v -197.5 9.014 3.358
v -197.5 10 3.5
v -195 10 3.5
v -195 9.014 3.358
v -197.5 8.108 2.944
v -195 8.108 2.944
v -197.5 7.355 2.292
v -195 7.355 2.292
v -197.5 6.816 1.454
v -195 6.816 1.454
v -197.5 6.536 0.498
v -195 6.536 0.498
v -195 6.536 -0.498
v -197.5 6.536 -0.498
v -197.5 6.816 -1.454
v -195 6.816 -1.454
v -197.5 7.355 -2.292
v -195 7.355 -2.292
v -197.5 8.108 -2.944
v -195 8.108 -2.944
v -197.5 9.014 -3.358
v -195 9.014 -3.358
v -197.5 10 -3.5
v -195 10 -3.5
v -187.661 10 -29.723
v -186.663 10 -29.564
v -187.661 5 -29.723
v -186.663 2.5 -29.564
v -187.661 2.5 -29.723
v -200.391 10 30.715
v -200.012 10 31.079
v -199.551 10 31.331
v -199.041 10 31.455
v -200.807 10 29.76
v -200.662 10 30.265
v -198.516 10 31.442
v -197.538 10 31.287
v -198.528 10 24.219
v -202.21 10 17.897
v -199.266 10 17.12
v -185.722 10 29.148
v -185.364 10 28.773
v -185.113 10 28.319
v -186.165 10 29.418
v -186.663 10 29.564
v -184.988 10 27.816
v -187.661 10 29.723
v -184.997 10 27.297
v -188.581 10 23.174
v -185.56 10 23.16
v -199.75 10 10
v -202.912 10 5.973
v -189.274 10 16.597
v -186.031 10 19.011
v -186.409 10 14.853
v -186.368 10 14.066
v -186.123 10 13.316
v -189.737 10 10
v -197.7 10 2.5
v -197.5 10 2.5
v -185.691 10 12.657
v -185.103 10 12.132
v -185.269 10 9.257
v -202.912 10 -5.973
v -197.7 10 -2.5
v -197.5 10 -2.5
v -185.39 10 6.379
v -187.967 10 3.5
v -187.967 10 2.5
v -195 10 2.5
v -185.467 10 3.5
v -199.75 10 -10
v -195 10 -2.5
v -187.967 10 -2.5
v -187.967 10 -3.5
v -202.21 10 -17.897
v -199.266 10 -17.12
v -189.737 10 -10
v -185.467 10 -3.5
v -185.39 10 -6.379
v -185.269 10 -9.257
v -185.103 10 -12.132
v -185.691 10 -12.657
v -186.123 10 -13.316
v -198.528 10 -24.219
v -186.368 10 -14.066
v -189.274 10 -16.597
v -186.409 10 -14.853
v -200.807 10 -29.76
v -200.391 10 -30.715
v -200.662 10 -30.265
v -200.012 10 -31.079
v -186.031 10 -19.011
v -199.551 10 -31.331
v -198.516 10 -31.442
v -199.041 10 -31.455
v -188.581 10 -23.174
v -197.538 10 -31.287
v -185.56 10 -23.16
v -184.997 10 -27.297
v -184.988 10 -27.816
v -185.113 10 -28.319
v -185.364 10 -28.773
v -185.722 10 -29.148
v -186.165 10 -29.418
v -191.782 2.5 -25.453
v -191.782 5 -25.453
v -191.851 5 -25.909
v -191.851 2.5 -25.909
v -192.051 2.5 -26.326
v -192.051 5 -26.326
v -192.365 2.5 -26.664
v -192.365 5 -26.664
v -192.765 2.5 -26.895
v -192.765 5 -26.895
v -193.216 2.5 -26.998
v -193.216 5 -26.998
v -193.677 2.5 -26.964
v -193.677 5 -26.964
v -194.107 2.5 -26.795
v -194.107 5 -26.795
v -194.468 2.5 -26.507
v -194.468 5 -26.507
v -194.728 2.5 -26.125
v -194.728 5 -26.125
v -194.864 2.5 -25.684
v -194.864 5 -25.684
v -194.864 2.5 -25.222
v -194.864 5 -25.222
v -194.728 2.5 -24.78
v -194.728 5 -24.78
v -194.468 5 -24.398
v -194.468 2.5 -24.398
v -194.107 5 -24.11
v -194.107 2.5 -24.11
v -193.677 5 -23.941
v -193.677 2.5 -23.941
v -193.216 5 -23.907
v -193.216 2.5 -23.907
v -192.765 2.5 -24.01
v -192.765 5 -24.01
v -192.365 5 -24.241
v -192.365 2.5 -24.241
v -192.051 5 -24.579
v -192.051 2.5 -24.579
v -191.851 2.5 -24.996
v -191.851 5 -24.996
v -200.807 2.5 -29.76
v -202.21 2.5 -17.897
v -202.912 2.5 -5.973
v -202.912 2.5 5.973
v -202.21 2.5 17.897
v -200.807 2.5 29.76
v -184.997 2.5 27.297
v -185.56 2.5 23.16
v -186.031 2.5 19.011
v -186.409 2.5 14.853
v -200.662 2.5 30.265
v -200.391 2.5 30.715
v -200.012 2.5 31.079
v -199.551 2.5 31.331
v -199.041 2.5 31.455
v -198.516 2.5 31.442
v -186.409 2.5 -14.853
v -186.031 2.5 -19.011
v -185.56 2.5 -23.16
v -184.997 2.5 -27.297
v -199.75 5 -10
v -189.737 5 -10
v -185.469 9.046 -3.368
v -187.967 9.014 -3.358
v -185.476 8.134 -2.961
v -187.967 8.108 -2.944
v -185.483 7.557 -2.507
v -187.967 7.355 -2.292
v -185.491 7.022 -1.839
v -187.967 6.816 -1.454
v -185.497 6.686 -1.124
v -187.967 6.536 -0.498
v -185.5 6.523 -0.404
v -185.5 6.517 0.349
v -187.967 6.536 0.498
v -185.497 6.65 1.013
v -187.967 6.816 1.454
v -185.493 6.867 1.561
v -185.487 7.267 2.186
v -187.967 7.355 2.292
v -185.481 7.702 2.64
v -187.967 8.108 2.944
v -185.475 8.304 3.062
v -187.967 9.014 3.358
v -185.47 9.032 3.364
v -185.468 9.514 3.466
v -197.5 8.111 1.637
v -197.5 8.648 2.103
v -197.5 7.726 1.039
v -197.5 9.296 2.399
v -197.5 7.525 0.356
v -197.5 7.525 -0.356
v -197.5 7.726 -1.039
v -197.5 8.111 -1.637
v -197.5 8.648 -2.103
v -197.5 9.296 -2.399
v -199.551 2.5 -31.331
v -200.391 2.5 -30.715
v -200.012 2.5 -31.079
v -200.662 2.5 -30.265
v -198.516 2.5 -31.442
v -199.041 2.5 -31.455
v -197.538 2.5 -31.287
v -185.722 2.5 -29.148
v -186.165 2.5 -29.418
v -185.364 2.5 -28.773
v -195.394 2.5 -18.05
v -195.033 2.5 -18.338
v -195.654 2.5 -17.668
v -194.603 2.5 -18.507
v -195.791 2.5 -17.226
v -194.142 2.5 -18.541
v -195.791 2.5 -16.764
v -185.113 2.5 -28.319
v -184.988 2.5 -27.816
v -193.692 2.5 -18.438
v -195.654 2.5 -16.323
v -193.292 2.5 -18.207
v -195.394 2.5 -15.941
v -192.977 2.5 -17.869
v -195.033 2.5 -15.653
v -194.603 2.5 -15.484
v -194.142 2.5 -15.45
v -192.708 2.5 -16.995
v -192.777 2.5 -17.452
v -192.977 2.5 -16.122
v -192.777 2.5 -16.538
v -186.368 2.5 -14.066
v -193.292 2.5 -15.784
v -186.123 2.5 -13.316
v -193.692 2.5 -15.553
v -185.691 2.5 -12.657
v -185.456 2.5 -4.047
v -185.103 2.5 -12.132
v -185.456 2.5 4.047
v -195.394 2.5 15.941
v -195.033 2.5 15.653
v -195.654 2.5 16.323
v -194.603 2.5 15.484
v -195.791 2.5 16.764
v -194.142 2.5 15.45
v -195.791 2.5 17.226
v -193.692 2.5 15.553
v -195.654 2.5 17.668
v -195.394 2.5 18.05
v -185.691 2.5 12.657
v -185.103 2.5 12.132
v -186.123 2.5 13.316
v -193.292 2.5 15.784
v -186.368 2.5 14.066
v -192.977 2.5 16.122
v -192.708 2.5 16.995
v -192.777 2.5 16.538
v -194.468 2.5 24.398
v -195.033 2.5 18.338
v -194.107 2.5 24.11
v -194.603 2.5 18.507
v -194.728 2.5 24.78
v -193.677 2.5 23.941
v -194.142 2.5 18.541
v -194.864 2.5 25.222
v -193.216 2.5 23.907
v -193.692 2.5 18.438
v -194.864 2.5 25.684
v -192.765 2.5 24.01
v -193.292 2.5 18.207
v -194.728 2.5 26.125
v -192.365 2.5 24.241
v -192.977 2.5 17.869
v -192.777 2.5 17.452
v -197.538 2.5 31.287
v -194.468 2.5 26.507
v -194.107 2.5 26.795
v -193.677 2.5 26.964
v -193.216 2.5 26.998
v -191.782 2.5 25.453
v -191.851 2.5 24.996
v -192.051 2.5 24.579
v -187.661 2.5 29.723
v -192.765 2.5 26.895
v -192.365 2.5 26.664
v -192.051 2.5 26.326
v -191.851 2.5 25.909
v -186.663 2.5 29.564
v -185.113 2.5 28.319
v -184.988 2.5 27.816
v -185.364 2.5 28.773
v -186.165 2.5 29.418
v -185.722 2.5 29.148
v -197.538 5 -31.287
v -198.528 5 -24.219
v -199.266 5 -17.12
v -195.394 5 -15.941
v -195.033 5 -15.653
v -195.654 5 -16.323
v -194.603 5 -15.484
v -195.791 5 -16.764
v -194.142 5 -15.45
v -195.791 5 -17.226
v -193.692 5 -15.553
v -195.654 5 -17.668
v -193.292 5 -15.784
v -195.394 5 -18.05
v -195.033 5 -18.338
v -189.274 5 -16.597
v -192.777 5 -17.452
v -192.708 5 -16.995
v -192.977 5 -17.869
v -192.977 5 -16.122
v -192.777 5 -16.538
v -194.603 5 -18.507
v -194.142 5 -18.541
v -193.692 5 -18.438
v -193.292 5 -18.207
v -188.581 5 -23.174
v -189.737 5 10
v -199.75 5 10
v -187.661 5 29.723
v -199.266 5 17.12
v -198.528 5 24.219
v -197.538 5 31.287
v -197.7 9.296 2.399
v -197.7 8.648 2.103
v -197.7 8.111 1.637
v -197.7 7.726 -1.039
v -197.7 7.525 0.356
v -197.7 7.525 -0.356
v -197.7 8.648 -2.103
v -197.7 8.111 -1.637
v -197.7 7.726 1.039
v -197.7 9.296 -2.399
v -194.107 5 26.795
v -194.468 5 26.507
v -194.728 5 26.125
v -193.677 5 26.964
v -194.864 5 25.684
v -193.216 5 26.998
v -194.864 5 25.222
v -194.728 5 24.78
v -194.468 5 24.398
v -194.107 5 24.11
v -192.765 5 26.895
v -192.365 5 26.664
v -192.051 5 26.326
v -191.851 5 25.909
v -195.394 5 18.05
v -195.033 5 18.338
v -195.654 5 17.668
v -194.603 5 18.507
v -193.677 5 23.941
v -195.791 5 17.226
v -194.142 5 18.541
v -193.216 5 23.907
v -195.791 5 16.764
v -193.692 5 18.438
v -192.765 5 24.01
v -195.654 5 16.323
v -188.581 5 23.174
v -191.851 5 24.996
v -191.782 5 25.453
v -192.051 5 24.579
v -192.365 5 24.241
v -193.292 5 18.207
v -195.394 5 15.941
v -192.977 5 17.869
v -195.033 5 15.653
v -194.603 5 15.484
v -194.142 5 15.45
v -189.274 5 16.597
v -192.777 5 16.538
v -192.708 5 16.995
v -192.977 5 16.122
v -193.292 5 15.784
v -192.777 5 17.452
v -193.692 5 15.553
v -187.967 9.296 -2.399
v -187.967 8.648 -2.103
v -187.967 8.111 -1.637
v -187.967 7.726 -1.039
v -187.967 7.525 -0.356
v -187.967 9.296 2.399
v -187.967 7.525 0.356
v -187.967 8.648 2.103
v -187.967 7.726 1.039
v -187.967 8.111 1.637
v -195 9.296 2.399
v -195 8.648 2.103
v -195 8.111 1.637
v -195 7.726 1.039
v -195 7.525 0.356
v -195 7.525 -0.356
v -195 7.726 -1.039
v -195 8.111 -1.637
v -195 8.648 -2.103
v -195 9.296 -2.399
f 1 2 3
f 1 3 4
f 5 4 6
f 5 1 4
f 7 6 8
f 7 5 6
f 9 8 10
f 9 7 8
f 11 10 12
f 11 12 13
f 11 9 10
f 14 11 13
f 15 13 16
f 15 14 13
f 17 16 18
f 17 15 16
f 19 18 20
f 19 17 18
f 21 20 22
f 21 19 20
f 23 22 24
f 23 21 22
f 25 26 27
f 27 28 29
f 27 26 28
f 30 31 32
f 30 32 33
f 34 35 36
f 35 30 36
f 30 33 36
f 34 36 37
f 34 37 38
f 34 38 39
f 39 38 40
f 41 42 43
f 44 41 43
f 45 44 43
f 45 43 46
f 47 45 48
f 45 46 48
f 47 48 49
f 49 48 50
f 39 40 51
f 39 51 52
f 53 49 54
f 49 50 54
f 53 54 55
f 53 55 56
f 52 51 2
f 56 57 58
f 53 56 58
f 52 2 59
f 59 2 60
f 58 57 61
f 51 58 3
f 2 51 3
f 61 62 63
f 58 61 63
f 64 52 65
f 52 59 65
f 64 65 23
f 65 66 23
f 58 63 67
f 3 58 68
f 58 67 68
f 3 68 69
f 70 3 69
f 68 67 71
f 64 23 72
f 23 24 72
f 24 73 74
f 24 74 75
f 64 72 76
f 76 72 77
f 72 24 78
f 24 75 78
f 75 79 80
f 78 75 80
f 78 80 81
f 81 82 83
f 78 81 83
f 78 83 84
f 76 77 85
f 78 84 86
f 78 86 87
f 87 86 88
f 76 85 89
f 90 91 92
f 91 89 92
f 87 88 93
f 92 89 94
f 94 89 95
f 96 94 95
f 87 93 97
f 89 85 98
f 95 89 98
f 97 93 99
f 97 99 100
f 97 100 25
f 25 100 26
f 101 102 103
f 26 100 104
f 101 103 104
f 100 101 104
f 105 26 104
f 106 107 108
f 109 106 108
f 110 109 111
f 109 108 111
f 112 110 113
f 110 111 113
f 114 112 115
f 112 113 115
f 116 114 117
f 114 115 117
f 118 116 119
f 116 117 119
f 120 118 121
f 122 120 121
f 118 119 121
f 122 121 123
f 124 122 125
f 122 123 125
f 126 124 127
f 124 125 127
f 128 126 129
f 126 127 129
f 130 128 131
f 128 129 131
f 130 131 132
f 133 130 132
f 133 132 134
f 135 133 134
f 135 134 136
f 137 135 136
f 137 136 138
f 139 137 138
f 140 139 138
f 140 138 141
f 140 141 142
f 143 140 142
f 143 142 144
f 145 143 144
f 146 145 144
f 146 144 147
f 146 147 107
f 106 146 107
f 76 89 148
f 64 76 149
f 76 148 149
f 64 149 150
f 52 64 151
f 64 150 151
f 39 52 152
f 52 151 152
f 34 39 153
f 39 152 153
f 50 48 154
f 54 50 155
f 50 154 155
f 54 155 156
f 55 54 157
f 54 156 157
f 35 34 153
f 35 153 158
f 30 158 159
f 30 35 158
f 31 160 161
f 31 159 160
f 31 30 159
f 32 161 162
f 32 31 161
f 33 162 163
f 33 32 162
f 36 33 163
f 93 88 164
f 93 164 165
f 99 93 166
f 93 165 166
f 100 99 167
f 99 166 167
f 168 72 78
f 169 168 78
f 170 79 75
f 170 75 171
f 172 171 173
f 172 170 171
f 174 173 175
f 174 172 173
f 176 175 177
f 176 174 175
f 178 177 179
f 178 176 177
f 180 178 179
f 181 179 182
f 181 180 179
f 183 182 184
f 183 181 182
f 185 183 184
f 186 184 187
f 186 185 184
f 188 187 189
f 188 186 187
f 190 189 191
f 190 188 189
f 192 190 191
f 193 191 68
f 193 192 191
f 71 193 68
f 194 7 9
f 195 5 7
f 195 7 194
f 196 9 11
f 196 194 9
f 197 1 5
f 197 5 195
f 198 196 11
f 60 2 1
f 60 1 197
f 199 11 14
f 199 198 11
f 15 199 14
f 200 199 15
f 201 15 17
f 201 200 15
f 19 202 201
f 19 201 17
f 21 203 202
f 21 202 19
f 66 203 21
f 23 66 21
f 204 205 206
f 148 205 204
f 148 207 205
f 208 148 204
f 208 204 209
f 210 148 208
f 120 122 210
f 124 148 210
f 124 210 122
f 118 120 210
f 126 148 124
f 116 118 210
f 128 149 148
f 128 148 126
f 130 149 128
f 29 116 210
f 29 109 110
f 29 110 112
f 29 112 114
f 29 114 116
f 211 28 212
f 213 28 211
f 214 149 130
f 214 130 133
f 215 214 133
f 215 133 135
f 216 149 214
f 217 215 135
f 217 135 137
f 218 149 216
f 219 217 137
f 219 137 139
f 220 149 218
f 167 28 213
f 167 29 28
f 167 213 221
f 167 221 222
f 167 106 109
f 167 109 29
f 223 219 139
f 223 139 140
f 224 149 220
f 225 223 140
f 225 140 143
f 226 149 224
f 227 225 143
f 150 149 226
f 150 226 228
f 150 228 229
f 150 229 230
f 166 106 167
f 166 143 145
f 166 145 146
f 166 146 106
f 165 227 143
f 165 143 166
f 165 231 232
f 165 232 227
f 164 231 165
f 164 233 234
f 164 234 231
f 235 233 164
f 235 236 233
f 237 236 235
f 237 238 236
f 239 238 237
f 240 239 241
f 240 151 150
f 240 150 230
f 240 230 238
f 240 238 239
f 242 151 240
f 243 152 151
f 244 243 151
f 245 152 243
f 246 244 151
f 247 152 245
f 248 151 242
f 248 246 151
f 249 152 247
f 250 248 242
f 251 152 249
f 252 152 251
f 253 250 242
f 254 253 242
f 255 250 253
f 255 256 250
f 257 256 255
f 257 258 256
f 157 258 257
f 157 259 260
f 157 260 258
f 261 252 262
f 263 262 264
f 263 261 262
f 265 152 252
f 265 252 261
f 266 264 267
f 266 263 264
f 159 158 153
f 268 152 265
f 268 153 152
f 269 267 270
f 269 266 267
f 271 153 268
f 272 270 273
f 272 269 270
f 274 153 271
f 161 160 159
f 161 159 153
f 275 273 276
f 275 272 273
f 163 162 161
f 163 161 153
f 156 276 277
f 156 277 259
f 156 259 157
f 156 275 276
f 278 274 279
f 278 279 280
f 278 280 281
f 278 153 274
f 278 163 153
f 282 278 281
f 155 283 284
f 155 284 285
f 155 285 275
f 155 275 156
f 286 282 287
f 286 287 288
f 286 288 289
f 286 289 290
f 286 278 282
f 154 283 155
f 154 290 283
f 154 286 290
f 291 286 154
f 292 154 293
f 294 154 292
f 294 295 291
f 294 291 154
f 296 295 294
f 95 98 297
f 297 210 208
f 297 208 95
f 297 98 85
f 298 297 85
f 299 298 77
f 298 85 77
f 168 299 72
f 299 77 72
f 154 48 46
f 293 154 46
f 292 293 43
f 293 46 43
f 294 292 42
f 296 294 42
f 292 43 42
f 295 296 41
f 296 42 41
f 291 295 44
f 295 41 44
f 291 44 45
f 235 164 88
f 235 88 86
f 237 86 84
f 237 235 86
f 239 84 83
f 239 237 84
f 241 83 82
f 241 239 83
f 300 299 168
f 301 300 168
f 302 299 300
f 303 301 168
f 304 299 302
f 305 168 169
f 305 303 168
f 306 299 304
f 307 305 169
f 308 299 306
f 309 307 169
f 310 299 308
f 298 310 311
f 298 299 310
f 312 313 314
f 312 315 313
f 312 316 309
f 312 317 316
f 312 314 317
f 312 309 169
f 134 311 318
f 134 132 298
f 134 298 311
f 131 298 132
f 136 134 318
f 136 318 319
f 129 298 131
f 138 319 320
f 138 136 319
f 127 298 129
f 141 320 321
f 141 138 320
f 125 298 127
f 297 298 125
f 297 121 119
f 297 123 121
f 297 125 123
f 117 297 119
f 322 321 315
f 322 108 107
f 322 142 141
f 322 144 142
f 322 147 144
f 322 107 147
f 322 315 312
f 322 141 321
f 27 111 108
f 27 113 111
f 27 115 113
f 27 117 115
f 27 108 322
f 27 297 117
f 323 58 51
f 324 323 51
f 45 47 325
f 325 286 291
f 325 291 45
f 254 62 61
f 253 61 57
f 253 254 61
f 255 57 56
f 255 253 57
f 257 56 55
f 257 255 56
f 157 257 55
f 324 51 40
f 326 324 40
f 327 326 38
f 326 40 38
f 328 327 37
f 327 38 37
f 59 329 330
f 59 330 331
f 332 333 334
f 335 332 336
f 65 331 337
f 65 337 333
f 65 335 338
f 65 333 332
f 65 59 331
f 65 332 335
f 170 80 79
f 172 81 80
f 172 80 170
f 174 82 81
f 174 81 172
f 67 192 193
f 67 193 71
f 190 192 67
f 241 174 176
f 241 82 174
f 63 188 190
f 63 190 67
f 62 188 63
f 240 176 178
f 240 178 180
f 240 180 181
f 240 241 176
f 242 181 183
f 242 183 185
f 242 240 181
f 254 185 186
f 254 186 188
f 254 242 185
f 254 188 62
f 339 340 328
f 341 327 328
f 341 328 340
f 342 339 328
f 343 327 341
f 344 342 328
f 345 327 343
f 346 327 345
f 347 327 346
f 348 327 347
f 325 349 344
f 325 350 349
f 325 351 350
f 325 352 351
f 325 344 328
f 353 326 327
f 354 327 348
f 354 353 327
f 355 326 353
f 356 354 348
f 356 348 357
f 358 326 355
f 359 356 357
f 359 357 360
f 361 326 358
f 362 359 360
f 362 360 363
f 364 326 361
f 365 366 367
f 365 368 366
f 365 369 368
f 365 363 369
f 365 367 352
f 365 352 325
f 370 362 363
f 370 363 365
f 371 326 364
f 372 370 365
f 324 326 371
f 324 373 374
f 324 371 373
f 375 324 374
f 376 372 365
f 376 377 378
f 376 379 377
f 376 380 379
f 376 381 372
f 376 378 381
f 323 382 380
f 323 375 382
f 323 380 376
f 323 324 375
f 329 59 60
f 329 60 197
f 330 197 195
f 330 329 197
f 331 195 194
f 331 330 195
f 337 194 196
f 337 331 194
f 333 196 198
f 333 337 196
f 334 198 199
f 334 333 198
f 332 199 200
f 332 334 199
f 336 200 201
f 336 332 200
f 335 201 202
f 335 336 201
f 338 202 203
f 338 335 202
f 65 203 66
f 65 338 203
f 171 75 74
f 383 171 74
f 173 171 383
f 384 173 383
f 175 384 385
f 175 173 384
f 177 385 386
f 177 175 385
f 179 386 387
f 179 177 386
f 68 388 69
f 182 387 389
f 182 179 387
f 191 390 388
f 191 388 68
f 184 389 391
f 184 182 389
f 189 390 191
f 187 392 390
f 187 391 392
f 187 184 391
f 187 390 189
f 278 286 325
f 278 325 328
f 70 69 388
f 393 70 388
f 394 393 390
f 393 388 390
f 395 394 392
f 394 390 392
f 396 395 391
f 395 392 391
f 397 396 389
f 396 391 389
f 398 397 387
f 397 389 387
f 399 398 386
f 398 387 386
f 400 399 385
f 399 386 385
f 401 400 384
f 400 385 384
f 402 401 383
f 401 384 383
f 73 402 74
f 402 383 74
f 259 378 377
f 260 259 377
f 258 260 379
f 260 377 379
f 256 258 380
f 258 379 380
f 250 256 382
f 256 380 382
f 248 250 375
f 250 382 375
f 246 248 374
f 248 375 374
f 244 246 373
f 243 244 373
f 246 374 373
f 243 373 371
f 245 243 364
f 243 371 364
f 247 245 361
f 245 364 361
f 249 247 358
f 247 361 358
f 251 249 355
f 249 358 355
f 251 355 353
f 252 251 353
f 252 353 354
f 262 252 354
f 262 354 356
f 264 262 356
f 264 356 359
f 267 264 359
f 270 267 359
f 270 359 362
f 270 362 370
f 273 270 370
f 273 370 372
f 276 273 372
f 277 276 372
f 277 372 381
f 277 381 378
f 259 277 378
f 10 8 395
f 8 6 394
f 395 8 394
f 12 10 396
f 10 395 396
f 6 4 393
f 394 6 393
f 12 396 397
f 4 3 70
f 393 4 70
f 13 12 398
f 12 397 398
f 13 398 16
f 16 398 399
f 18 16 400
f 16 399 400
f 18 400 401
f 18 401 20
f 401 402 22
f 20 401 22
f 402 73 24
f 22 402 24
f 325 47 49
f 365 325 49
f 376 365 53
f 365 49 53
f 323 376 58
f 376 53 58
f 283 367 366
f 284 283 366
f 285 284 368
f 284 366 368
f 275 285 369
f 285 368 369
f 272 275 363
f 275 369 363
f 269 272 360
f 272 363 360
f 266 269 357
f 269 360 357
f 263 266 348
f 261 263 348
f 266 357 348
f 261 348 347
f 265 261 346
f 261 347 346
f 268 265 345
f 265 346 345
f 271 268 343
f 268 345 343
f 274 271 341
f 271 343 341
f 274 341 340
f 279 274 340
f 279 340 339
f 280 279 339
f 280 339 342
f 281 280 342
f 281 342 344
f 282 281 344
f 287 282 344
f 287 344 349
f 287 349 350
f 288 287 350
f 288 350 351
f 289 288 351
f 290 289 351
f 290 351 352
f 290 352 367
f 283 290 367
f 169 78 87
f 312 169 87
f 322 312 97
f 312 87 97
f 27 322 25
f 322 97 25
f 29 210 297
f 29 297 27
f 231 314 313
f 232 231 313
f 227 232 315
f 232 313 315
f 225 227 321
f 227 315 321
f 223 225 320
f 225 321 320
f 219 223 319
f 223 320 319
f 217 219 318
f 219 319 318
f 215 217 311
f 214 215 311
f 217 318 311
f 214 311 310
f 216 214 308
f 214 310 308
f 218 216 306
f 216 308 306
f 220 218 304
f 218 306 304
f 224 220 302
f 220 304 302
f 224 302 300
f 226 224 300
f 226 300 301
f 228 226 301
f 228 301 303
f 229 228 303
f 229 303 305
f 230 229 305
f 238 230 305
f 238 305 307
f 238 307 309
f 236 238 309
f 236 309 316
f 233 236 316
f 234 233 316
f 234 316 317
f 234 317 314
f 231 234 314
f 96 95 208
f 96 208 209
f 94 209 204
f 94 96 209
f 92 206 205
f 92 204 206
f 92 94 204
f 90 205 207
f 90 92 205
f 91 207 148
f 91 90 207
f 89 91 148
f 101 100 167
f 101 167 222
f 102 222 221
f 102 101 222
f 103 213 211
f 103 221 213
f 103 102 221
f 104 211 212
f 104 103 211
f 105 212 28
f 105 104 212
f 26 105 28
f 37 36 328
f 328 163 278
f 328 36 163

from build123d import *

# Parameters (mm, degrees)
BOSS_EXTRUDE1_DEPTH        = 10
CUT_EXTRUDE1_DEPTH         = 5
F_3_1_3_1_DIAMETER_HOLE2_D = 3.1
BOSS_EXTRUDE2_DEPTH        = 10
FILLET1_R                  = 3
FILLET2_R                  = 2
SKETCH21_R                 = 2.1
CUT_EXTRUDE2_DEPTH         = 36.312840879
SKETCH22_R                 = 3.5
CUT_EXTRUDE3_DEPTH         = 2.5
CUT_EXTRUDE4_DEPTH         = 2.7
CUT_EXTRUDE4_DEPTH_BACK    = 0.2
SKETCH23_R                 = 2.5
SKETCH24_W                 = 2.5
SKETCH24_H                 = 3.5
SKETCH25_R                 = 2.5
CUT_EXTRUDE5_DEPTH         = 9.733021807
CUT_EXTRUDE6_DEPTH         = 2.5


with BuildPart() as part:
    # Sketch1 → Boss-Extrude1 (new body)
    with BuildSketch(Plane(origin=(0, 0, 0), x_dir=(1, 0, 0), z_dir=(0, 1, 0))):
        with BuildLine():
            ThreePointArc((-187.660784713, 29.722548358), (-190, 0), (-187.660784713, -29.722548358))
            Line((-187.660784713, -29.722548358), (-197.537668119, -31.286893008))
            ThreePointArc((-197.537668119, -31.286893008), (-200, 0), (-197.537668119, 31.286893008))
            Line((-197.537668119, 31.286893008), (-187.660784713, 29.722548358))
        make_face()
        with BuildLine():
            ThreePointArc((-197.537668119, -31.286893008), (-200, 0), (-197.537668119, 31.286893008))
            Line((-197.537668119, 31.286893008), (-200.500733141, 31.756196403))
            ThreePointArc((-200.500733141, 31.756196403), (-203, 0), (-200.500733141, -31.756196403))
            Line((-200.500733141, -31.756196403), (-197.537668119, -31.286893008))
        make_face()
        with BuildLine():
            Line((-184.697719691, 29.253244963), (-187.660784713, 29.722548358))
            ThreePointArc((-187.660784713, 29.722548358), (-190, 0), (-187.660784713, -29.722548358))
            Line((-187.660784713, -29.722548358), (-184.697719691, -29.253244963))
            ThreePointArc((-184.697719691, -29.253244963), (-187, 0), (-184.697719691, 29.253244963))
        make_face()
    extrude(amount=BOSS_EXTRUDE1_DEPTH)

    # Sketch15 → Cut-Extrude1 (cut)
    with BuildSketch(Plane(origin=(0, 10, 0), x_dir=(1, 0, 0), z_dir=(0, 1, 0))):
        with BuildLine():
            Line((-199.749843554, 10), (-189.73665961, 10))
            ThreePointArc((-189.73665961, 10), (-188.956218405, 19.88837666), (-187.660784713, 29.722548358))
            Line((-187.660784713, 29.722548358), (-197.537668119, 31.286893008))
            ThreePointArc((-197.537668119, 31.286893008), (-198.928692466, 20.673057674), (-199.749843554, 10))
        make_face()
        with BuildLine():
            ThreePointArc((-187.660784713, -29.722548358), (-188.956218405, -19.88837666), (-189.73665961, -10))
            Line((-189.73665961, -10), (-199.749843554, -10))
            ThreePointArc((-199.749843554, -10), (-198.928692466, -20.673057674), (-197.537668119, -31.286893008))
            Line((-197.537668119, -31.286893008), (-187.660784713, -29.722548358))
        make_face()
    extrude(amount=-CUT_EXTRUDE1_DEPTH, mode=Mode.SUBTRACT)

    # Ø3.1 (3.1) Diameter Hole2 (through all)
    with Locations(Plane(origin=(0, 0, 0), x_dir=(-1, 0, 0), z_dir=(0, -1, 0))):
        with Locations((193.331747968, -25.452607483), (194.257966128, -16.995369836), (194.257966128, 16.995369836), (193.331747968, 25.452607483)):
            Hole(F_3_1_3_1_DIAMETER_HOLE2_D / 2)

    # Sketch19 → Boss-Extrude2 (add)
    with BuildSketch(Plane(origin=(0, 0, 0), x_dir=(1, 0, 0), z_dir=(0, 1, 0))):
        with BuildLine():
            Line((-185.102830261, -12.132280472), (-186.599618646, -12.230385166))
            ThreePointArc((-186.599618646, -12.230385166), (-187, 0), (-186.599618646, 12.230385166))
            Line((-186.599618646, 12.230385166), (-185.102830261, 12.132280472))
            ThreePointArc((-185.102830261, 12.132280472), (-185.5, 0), (-185.102830261, -12.132280472))
        make_face()
    extrude(amount=BOSS_EXTRUDE2_DEPTH)

    # Fillet1
    # the kernel refuses this fillet: 3 mm, written as the material it adds along each edge
    with BuildSketch(Plane(origin=(-186.599618646, 0, -12.230385166), x_dir=(0.07241784502459461, 0, -0.9973743809232287), z_dir=(0, 1, 0))) as fillet1_piece_1:
        with BuildLine():
            CenterArc((2.608644701, -2.999925838), FILLET1_R, 89.597127862, 60.403689883)
            Line((0.010547081, -1.499962919), (-0.041414871, -1.469963661))
            ThreePointArc((-0.041414871, -1.469963661), (-0.054724976, -0.750403343), (-0.059998517, -0.000421883))
            Line((-0.059998517, -0.000421883), (-0.000421883, 0.059998517))
            ThreePointArc((-0.000421883, 0.059998517), (1.314869431, 0.064622735), (2.630160746, 0.059998517))
            Line((2.630160746, 0.059998517), (2.629738863, 0))
        make_face()
    extrude(amount=10)
    with BuildSketch(Plane(origin=(-186.599618646, 0, 12.230385166), x_dir=(0.0724178450245846, 0, 0.9973743809232295), z_dir=(0, 1, 0))) as fillet1_piece_2:
        with BuildLine():
            CenterArc((2.608644701, 2.999925838), FILLET1_R, 209.999182255, 60.403689883)
            Line((0.010547081, 1.499962919), (-0.041414871, 1.469963661))
            ThreePointArc((-0.041414871, 1.469963661), (-0.054724976, 0.750403343), (-0.059998517, 0.000421883))
            Line((-0.059998517, 0.000421883), (-0.000421883, -0.059998517))
            ThreePointArc((-0.000421883, -0.059998517), (1.314869431, -0.064622735), (2.630160746, -0.059998517))
            Line((2.630160746, -0.059998517), (2.629738863, 0))
        make_face()
    extrude(amount=10)

    # Fillet2
    fillet2_edges = [part.edges().sort_by_distance(p)[0] for p in [
        (-200.500733141, 5, 31.756196403),
        (-200.500733141, 5, -31.756196403),
        (-184.697719691, 5, -29.253244963),
        (-184.697719691, 5, 29.253244963),
    ]]
    fillet(fillet2_edges, radius=FILLET2_R)

    # Sketch21 → Cut-Extrude2 (cut, through all)
    with BuildSketch(Plane(origin=(-197.5, 0, 0), x_dir=(0, 0, -1), z_dir=(1, 0, 0))):
        with Locations((0, 10)):
            Circle(SKETCH21_R)
    extrude(amount=CUT_EXTRUDE2_DEPTH, mode=Mode.SUBTRACT)

    # Sketch22 → Cut-Extrude3 (cut)
    with BuildSketch(Plane(origin=(-197.5, 0, 0), x_dir=(0, 0, -1), z_dir=(1, 0, 0))):
        with Locations((0, 10)):
            Circle(SKETCH22_R)
    extrude(amount=CUT_EXTRUDE3_DEPTH, mode=Mode.SUBTRACT)

    # Sketch23 → Cut-Extrude4 (cut, two sides: drawn at the far end of the back side and taken through both)
    with BuildSketch(Plane(origin=(-197.5, 0, 0), x_dir=(0, 0, -1), z_dir=(1, 0, 0)).offset(-CUT_EXTRUDE4_DEPTH_BACK)):
        with Locations((0, 10)):
            Circle(SKETCH23_R)
    extrude(amount=CUT_EXTRUDE4_DEPTH + CUT_EXTRUDE4_DEPTH_BACK, mode=Mode.SUBTRACT)

    # Sketch24 → Cut-Revolve1 (revolve, cut)
    with BuildSketch(Plane(origin=(0, 10, 0), x_dir=(1, 0, 0), z_dir=(0, 1, 0))):
        with Locations((-186.716978193, 1.75)):
            Rectangle(SKETCH24_W, SKETCH24_H)
    revolve(axis=Axis((-185.5, 10, 0), (-1, 0, 0)), mode=Mode.SUBTRACT)

    # Sketch25 → Cut-Extrude5 (cut)
    with BuildSketch(Plane(origin=(-187.966978193, 0, 0), x_dir=(0, 0, -1), z_dir=(1, 0, 0))):
        with Locations((0, 10)):
            Circle(SKETCH25_R)
    extrude(amount=-CUT_EXTRUDE5_DEPTH, mode=Mode.SUBTRACT)

    # Sketch26 → Cut-Extrude6 (cut)
    with BuildSketch(Plane.XZ):
        with BuildLine():
            Line((-198.515528472, -31.441770873), (-186.662644351, -29.564458455))
            ThreePointArc((-186.662644351, -29.564458455), (-185.363721979, -28.773196969), (-184.996936421, -27.297133819))
            ThreePointArc((-184.996936421, -27.297133819), (-185.807261228, -21.087002508), (-186.409178624, -14.853219336))
            ThreePointArc((-186.409178624, -14.853219336), (-186.123110766, -13.316498702), (-185.102830261, -12.132280472))
            ThreePointArc((-185.102830261, -12.132280472), (-185.5, 0), (-185.102830261, 12.132280472))
            ThreePointArc((-185.102830261, 12.132280472), (-186.123110766, 13.316498702), (-186.409178624, 14.853219336))
            ThreePointArc((-186.409178624, 14.853219336), (-185.807261228, 21.087002508), (-184.996936421, 27.297133819))
            ThreePointArc((-184.996936421, 27.297133819), (-185.363721979, 28.773196969), (-186.662644351, 29.564458455))
            Line((-186.662644351, 29.564458455), (-198.515528472, 31.441770873))
            ThreePointArc((-198.515528472, 31.441770873), (-200.012003377, 31.078559473), (-200.806789416, 29.759592144))
            ThreePointArc((-200.806789416, 29.759592144), (-203, 0), (-200.806789416, -29.759592144))
            ThreePointArc((-200.806789416, -29.759592144), (-200.012003377, -31.078559473), (-198.515528472, -31.441770873))
        make_face()
    extrude(amount=-CUT_EXTRUDE6_DEPTH, mode=Mode.SUBTRACT)


solid = part.part
